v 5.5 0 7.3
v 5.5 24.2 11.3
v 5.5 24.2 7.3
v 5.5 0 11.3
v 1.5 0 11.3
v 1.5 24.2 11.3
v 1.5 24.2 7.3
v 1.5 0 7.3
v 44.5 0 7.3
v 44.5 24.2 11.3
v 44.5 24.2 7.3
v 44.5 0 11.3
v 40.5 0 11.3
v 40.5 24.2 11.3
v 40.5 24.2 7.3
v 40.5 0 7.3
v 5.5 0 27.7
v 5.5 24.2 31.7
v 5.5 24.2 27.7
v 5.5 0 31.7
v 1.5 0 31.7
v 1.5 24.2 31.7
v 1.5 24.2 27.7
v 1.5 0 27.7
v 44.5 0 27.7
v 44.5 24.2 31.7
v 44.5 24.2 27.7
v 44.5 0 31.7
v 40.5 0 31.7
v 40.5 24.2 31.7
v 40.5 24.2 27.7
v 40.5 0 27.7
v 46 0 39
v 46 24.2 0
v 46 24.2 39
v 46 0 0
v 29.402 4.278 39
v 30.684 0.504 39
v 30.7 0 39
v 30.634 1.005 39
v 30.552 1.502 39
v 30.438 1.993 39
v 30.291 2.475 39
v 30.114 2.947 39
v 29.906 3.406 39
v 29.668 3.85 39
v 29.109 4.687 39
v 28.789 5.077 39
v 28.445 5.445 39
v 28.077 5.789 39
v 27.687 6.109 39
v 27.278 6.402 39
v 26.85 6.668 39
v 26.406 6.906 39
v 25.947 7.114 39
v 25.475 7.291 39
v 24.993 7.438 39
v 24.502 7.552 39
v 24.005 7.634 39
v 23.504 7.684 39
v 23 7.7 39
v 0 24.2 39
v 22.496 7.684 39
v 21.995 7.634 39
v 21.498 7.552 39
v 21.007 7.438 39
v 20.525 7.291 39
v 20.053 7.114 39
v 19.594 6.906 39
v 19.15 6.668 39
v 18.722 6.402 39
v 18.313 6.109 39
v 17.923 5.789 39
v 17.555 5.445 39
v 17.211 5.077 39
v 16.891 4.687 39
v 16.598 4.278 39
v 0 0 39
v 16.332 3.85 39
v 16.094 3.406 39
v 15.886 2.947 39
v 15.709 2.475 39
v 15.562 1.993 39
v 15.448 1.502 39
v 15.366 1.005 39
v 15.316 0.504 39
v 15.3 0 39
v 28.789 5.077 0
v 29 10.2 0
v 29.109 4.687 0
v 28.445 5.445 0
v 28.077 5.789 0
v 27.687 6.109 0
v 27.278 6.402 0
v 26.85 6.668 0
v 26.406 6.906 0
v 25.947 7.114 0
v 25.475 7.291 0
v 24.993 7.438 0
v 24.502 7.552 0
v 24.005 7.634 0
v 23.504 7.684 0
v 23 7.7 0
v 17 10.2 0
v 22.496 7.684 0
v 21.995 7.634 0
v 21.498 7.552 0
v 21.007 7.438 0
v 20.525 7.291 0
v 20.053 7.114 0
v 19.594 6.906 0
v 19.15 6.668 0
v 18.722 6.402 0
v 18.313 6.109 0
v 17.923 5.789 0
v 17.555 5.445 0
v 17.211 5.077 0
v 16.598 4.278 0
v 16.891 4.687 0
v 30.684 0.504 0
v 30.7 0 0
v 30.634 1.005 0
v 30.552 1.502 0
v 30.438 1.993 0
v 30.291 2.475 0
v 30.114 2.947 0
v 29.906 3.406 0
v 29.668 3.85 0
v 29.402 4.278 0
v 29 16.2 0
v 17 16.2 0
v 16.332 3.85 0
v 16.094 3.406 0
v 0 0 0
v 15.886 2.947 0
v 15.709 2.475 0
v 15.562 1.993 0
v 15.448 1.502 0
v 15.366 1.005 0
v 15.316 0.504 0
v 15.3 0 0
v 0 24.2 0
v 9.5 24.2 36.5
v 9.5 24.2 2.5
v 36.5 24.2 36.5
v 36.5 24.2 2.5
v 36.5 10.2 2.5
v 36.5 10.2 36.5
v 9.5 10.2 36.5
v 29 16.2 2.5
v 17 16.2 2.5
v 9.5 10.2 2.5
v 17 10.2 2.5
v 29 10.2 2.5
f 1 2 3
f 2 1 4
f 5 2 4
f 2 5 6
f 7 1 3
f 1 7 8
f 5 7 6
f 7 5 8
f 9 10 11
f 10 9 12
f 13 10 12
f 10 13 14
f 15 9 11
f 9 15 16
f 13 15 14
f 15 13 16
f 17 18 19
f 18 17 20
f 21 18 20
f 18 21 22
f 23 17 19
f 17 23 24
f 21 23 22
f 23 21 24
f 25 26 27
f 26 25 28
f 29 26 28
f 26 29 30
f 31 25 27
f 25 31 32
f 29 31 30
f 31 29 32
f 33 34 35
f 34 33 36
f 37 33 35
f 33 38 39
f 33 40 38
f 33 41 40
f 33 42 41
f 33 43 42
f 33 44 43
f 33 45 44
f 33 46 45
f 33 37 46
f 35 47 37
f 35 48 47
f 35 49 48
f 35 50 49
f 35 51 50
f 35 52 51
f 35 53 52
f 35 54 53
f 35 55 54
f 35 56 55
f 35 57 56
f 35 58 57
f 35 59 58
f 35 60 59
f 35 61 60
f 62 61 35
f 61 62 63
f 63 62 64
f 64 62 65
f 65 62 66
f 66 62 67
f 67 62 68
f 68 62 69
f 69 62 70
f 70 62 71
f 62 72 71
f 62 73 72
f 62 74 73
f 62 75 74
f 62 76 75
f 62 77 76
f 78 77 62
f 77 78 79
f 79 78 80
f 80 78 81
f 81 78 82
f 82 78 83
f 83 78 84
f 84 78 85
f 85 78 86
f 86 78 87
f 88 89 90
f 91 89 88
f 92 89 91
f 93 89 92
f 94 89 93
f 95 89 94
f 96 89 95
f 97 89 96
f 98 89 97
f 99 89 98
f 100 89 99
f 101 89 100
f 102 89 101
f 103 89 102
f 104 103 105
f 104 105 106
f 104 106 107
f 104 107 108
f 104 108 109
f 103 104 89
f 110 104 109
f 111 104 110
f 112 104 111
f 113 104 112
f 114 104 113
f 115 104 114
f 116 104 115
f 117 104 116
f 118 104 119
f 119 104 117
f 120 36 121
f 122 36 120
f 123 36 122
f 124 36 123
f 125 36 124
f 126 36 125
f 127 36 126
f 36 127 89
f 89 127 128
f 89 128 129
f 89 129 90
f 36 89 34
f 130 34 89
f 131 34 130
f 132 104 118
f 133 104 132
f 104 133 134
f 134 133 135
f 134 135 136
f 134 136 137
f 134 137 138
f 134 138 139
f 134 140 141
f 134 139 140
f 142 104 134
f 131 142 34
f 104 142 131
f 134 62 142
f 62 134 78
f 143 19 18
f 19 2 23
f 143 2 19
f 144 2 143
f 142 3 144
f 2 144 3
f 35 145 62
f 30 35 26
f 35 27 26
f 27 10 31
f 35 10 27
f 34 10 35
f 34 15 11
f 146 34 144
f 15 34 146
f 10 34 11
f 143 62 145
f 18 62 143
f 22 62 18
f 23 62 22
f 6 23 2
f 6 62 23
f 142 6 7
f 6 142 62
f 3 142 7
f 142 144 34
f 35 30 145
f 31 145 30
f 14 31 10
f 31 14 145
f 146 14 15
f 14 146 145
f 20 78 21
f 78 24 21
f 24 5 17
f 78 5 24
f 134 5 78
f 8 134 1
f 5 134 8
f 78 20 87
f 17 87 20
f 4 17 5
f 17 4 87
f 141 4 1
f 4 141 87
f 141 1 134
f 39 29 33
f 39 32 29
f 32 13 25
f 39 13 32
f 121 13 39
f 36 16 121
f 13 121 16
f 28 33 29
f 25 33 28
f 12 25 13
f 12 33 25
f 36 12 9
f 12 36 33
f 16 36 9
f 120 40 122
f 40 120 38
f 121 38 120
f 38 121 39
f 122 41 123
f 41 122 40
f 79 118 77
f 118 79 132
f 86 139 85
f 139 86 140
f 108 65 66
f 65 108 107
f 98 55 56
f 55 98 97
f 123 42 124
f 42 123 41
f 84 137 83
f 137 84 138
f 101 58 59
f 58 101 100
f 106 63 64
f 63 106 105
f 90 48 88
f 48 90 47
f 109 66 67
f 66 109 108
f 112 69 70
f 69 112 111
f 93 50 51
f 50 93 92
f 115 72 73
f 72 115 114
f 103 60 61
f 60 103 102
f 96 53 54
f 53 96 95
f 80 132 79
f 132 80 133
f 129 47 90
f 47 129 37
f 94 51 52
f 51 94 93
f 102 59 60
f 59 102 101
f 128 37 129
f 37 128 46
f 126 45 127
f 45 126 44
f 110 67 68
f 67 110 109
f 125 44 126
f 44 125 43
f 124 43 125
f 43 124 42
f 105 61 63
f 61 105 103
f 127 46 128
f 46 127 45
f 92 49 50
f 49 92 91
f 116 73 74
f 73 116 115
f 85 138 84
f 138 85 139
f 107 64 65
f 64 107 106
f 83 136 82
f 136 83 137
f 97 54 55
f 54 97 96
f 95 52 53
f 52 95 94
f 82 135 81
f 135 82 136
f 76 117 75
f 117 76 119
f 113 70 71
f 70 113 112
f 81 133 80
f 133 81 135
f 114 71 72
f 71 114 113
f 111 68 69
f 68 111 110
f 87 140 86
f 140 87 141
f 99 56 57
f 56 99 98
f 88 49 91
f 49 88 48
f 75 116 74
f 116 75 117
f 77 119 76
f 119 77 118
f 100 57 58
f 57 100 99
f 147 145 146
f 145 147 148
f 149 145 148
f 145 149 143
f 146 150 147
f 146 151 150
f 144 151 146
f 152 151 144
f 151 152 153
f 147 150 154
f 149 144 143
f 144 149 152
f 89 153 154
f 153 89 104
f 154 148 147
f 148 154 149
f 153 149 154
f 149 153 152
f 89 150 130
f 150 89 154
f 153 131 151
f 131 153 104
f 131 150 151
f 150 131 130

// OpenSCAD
// GolfTracker — bare-shaft clip mount (parametric)
// Clamps to the bare metal shaft just below the grip. The electronics bundle
// sits in the open-top pocket; two zip ties through the wing slots wrap the
// shaft into the channel. Orient the bundle so the sensor +Z axis points DOWN
// the shaft toward the clubhead (the frame convention the firmware/app assume).
//
// >>> MEASURE your parts with calipers and edit the values below, then re-render.
// Render an STL:  openscad -o shaft_clip.stl shaft_clip.scad
// (or edit generate_stl.py and run it — same geometry, no OpenSCAD needed)

// ---- parameters (mm) ----
shaft_d   = 15.0;  // bare shaft diameter at the clamp point (just below grip)
shaft_gap = 0.4;   // channel clearance over the shaft (increase if too tight)
bundle_l  = 34.0;  // taped bundle length  (runs ALONG the shaft)
bundle_w  = 27.0;  // taped bundle width
bundle_h  = 14.0;  // taped bundle depth  (pocket depth)
wall      = 2.5;   // pocket wall thickness
web       = 2.5;   // material between channel apex and pocket floor
wing      = 7.0;   // zip-tie wing width each side
usb_w     = 12.0;  // micro-USB cutout width
usb_h     = 6.0;   // micro-USB cutout height
tie_w     = 4.0;   // zip-tie slot width
$fn       = 96;

// ---- derived ----
r_ch = (shaft_d + shaft_gap) / 2;
W    = bundle_w + 2*wall + 2*wing;   // X (width)
pf   = r_ch + web;                   // pocket floor height
T    = pf + bundle_h;                // Y (height)
L    = bundle_l + 2*wall;            // Z (along shaft)
cx   = W/2;

module shaft_clip() {
  difference() {
    cube([W, T, L]);

    // shaft channel (semicircular groove along Z at bottom-center)
    translate([cx, 0, -2]) cylinder(h = L+4, r = r_ch);

    // electronics pocket (open top)
    translate([cx - bundle_w/2, pf, L/2 - bundle_l/2])
      cube([bundle_w, T - pf + 4, bundle_l]);

    // micro-USB access cutout through one end wall
    translate([cx - usb_w/2, pf, -2]) cube([usb_w, usb_h, wall+4]);

    // zip-tie slots: 2 ties x 2 wings
    for (z = [bundle_l*0.2 + wall, bundle_l*0.8 + wall])
      for (wx = [wing/2, W - wing/2])
        translate([wx - tie_w/2, -2, z - tie_w/2]) cube([tie_w, T+4, tie_w]);
  }
}

shaft_clip();
